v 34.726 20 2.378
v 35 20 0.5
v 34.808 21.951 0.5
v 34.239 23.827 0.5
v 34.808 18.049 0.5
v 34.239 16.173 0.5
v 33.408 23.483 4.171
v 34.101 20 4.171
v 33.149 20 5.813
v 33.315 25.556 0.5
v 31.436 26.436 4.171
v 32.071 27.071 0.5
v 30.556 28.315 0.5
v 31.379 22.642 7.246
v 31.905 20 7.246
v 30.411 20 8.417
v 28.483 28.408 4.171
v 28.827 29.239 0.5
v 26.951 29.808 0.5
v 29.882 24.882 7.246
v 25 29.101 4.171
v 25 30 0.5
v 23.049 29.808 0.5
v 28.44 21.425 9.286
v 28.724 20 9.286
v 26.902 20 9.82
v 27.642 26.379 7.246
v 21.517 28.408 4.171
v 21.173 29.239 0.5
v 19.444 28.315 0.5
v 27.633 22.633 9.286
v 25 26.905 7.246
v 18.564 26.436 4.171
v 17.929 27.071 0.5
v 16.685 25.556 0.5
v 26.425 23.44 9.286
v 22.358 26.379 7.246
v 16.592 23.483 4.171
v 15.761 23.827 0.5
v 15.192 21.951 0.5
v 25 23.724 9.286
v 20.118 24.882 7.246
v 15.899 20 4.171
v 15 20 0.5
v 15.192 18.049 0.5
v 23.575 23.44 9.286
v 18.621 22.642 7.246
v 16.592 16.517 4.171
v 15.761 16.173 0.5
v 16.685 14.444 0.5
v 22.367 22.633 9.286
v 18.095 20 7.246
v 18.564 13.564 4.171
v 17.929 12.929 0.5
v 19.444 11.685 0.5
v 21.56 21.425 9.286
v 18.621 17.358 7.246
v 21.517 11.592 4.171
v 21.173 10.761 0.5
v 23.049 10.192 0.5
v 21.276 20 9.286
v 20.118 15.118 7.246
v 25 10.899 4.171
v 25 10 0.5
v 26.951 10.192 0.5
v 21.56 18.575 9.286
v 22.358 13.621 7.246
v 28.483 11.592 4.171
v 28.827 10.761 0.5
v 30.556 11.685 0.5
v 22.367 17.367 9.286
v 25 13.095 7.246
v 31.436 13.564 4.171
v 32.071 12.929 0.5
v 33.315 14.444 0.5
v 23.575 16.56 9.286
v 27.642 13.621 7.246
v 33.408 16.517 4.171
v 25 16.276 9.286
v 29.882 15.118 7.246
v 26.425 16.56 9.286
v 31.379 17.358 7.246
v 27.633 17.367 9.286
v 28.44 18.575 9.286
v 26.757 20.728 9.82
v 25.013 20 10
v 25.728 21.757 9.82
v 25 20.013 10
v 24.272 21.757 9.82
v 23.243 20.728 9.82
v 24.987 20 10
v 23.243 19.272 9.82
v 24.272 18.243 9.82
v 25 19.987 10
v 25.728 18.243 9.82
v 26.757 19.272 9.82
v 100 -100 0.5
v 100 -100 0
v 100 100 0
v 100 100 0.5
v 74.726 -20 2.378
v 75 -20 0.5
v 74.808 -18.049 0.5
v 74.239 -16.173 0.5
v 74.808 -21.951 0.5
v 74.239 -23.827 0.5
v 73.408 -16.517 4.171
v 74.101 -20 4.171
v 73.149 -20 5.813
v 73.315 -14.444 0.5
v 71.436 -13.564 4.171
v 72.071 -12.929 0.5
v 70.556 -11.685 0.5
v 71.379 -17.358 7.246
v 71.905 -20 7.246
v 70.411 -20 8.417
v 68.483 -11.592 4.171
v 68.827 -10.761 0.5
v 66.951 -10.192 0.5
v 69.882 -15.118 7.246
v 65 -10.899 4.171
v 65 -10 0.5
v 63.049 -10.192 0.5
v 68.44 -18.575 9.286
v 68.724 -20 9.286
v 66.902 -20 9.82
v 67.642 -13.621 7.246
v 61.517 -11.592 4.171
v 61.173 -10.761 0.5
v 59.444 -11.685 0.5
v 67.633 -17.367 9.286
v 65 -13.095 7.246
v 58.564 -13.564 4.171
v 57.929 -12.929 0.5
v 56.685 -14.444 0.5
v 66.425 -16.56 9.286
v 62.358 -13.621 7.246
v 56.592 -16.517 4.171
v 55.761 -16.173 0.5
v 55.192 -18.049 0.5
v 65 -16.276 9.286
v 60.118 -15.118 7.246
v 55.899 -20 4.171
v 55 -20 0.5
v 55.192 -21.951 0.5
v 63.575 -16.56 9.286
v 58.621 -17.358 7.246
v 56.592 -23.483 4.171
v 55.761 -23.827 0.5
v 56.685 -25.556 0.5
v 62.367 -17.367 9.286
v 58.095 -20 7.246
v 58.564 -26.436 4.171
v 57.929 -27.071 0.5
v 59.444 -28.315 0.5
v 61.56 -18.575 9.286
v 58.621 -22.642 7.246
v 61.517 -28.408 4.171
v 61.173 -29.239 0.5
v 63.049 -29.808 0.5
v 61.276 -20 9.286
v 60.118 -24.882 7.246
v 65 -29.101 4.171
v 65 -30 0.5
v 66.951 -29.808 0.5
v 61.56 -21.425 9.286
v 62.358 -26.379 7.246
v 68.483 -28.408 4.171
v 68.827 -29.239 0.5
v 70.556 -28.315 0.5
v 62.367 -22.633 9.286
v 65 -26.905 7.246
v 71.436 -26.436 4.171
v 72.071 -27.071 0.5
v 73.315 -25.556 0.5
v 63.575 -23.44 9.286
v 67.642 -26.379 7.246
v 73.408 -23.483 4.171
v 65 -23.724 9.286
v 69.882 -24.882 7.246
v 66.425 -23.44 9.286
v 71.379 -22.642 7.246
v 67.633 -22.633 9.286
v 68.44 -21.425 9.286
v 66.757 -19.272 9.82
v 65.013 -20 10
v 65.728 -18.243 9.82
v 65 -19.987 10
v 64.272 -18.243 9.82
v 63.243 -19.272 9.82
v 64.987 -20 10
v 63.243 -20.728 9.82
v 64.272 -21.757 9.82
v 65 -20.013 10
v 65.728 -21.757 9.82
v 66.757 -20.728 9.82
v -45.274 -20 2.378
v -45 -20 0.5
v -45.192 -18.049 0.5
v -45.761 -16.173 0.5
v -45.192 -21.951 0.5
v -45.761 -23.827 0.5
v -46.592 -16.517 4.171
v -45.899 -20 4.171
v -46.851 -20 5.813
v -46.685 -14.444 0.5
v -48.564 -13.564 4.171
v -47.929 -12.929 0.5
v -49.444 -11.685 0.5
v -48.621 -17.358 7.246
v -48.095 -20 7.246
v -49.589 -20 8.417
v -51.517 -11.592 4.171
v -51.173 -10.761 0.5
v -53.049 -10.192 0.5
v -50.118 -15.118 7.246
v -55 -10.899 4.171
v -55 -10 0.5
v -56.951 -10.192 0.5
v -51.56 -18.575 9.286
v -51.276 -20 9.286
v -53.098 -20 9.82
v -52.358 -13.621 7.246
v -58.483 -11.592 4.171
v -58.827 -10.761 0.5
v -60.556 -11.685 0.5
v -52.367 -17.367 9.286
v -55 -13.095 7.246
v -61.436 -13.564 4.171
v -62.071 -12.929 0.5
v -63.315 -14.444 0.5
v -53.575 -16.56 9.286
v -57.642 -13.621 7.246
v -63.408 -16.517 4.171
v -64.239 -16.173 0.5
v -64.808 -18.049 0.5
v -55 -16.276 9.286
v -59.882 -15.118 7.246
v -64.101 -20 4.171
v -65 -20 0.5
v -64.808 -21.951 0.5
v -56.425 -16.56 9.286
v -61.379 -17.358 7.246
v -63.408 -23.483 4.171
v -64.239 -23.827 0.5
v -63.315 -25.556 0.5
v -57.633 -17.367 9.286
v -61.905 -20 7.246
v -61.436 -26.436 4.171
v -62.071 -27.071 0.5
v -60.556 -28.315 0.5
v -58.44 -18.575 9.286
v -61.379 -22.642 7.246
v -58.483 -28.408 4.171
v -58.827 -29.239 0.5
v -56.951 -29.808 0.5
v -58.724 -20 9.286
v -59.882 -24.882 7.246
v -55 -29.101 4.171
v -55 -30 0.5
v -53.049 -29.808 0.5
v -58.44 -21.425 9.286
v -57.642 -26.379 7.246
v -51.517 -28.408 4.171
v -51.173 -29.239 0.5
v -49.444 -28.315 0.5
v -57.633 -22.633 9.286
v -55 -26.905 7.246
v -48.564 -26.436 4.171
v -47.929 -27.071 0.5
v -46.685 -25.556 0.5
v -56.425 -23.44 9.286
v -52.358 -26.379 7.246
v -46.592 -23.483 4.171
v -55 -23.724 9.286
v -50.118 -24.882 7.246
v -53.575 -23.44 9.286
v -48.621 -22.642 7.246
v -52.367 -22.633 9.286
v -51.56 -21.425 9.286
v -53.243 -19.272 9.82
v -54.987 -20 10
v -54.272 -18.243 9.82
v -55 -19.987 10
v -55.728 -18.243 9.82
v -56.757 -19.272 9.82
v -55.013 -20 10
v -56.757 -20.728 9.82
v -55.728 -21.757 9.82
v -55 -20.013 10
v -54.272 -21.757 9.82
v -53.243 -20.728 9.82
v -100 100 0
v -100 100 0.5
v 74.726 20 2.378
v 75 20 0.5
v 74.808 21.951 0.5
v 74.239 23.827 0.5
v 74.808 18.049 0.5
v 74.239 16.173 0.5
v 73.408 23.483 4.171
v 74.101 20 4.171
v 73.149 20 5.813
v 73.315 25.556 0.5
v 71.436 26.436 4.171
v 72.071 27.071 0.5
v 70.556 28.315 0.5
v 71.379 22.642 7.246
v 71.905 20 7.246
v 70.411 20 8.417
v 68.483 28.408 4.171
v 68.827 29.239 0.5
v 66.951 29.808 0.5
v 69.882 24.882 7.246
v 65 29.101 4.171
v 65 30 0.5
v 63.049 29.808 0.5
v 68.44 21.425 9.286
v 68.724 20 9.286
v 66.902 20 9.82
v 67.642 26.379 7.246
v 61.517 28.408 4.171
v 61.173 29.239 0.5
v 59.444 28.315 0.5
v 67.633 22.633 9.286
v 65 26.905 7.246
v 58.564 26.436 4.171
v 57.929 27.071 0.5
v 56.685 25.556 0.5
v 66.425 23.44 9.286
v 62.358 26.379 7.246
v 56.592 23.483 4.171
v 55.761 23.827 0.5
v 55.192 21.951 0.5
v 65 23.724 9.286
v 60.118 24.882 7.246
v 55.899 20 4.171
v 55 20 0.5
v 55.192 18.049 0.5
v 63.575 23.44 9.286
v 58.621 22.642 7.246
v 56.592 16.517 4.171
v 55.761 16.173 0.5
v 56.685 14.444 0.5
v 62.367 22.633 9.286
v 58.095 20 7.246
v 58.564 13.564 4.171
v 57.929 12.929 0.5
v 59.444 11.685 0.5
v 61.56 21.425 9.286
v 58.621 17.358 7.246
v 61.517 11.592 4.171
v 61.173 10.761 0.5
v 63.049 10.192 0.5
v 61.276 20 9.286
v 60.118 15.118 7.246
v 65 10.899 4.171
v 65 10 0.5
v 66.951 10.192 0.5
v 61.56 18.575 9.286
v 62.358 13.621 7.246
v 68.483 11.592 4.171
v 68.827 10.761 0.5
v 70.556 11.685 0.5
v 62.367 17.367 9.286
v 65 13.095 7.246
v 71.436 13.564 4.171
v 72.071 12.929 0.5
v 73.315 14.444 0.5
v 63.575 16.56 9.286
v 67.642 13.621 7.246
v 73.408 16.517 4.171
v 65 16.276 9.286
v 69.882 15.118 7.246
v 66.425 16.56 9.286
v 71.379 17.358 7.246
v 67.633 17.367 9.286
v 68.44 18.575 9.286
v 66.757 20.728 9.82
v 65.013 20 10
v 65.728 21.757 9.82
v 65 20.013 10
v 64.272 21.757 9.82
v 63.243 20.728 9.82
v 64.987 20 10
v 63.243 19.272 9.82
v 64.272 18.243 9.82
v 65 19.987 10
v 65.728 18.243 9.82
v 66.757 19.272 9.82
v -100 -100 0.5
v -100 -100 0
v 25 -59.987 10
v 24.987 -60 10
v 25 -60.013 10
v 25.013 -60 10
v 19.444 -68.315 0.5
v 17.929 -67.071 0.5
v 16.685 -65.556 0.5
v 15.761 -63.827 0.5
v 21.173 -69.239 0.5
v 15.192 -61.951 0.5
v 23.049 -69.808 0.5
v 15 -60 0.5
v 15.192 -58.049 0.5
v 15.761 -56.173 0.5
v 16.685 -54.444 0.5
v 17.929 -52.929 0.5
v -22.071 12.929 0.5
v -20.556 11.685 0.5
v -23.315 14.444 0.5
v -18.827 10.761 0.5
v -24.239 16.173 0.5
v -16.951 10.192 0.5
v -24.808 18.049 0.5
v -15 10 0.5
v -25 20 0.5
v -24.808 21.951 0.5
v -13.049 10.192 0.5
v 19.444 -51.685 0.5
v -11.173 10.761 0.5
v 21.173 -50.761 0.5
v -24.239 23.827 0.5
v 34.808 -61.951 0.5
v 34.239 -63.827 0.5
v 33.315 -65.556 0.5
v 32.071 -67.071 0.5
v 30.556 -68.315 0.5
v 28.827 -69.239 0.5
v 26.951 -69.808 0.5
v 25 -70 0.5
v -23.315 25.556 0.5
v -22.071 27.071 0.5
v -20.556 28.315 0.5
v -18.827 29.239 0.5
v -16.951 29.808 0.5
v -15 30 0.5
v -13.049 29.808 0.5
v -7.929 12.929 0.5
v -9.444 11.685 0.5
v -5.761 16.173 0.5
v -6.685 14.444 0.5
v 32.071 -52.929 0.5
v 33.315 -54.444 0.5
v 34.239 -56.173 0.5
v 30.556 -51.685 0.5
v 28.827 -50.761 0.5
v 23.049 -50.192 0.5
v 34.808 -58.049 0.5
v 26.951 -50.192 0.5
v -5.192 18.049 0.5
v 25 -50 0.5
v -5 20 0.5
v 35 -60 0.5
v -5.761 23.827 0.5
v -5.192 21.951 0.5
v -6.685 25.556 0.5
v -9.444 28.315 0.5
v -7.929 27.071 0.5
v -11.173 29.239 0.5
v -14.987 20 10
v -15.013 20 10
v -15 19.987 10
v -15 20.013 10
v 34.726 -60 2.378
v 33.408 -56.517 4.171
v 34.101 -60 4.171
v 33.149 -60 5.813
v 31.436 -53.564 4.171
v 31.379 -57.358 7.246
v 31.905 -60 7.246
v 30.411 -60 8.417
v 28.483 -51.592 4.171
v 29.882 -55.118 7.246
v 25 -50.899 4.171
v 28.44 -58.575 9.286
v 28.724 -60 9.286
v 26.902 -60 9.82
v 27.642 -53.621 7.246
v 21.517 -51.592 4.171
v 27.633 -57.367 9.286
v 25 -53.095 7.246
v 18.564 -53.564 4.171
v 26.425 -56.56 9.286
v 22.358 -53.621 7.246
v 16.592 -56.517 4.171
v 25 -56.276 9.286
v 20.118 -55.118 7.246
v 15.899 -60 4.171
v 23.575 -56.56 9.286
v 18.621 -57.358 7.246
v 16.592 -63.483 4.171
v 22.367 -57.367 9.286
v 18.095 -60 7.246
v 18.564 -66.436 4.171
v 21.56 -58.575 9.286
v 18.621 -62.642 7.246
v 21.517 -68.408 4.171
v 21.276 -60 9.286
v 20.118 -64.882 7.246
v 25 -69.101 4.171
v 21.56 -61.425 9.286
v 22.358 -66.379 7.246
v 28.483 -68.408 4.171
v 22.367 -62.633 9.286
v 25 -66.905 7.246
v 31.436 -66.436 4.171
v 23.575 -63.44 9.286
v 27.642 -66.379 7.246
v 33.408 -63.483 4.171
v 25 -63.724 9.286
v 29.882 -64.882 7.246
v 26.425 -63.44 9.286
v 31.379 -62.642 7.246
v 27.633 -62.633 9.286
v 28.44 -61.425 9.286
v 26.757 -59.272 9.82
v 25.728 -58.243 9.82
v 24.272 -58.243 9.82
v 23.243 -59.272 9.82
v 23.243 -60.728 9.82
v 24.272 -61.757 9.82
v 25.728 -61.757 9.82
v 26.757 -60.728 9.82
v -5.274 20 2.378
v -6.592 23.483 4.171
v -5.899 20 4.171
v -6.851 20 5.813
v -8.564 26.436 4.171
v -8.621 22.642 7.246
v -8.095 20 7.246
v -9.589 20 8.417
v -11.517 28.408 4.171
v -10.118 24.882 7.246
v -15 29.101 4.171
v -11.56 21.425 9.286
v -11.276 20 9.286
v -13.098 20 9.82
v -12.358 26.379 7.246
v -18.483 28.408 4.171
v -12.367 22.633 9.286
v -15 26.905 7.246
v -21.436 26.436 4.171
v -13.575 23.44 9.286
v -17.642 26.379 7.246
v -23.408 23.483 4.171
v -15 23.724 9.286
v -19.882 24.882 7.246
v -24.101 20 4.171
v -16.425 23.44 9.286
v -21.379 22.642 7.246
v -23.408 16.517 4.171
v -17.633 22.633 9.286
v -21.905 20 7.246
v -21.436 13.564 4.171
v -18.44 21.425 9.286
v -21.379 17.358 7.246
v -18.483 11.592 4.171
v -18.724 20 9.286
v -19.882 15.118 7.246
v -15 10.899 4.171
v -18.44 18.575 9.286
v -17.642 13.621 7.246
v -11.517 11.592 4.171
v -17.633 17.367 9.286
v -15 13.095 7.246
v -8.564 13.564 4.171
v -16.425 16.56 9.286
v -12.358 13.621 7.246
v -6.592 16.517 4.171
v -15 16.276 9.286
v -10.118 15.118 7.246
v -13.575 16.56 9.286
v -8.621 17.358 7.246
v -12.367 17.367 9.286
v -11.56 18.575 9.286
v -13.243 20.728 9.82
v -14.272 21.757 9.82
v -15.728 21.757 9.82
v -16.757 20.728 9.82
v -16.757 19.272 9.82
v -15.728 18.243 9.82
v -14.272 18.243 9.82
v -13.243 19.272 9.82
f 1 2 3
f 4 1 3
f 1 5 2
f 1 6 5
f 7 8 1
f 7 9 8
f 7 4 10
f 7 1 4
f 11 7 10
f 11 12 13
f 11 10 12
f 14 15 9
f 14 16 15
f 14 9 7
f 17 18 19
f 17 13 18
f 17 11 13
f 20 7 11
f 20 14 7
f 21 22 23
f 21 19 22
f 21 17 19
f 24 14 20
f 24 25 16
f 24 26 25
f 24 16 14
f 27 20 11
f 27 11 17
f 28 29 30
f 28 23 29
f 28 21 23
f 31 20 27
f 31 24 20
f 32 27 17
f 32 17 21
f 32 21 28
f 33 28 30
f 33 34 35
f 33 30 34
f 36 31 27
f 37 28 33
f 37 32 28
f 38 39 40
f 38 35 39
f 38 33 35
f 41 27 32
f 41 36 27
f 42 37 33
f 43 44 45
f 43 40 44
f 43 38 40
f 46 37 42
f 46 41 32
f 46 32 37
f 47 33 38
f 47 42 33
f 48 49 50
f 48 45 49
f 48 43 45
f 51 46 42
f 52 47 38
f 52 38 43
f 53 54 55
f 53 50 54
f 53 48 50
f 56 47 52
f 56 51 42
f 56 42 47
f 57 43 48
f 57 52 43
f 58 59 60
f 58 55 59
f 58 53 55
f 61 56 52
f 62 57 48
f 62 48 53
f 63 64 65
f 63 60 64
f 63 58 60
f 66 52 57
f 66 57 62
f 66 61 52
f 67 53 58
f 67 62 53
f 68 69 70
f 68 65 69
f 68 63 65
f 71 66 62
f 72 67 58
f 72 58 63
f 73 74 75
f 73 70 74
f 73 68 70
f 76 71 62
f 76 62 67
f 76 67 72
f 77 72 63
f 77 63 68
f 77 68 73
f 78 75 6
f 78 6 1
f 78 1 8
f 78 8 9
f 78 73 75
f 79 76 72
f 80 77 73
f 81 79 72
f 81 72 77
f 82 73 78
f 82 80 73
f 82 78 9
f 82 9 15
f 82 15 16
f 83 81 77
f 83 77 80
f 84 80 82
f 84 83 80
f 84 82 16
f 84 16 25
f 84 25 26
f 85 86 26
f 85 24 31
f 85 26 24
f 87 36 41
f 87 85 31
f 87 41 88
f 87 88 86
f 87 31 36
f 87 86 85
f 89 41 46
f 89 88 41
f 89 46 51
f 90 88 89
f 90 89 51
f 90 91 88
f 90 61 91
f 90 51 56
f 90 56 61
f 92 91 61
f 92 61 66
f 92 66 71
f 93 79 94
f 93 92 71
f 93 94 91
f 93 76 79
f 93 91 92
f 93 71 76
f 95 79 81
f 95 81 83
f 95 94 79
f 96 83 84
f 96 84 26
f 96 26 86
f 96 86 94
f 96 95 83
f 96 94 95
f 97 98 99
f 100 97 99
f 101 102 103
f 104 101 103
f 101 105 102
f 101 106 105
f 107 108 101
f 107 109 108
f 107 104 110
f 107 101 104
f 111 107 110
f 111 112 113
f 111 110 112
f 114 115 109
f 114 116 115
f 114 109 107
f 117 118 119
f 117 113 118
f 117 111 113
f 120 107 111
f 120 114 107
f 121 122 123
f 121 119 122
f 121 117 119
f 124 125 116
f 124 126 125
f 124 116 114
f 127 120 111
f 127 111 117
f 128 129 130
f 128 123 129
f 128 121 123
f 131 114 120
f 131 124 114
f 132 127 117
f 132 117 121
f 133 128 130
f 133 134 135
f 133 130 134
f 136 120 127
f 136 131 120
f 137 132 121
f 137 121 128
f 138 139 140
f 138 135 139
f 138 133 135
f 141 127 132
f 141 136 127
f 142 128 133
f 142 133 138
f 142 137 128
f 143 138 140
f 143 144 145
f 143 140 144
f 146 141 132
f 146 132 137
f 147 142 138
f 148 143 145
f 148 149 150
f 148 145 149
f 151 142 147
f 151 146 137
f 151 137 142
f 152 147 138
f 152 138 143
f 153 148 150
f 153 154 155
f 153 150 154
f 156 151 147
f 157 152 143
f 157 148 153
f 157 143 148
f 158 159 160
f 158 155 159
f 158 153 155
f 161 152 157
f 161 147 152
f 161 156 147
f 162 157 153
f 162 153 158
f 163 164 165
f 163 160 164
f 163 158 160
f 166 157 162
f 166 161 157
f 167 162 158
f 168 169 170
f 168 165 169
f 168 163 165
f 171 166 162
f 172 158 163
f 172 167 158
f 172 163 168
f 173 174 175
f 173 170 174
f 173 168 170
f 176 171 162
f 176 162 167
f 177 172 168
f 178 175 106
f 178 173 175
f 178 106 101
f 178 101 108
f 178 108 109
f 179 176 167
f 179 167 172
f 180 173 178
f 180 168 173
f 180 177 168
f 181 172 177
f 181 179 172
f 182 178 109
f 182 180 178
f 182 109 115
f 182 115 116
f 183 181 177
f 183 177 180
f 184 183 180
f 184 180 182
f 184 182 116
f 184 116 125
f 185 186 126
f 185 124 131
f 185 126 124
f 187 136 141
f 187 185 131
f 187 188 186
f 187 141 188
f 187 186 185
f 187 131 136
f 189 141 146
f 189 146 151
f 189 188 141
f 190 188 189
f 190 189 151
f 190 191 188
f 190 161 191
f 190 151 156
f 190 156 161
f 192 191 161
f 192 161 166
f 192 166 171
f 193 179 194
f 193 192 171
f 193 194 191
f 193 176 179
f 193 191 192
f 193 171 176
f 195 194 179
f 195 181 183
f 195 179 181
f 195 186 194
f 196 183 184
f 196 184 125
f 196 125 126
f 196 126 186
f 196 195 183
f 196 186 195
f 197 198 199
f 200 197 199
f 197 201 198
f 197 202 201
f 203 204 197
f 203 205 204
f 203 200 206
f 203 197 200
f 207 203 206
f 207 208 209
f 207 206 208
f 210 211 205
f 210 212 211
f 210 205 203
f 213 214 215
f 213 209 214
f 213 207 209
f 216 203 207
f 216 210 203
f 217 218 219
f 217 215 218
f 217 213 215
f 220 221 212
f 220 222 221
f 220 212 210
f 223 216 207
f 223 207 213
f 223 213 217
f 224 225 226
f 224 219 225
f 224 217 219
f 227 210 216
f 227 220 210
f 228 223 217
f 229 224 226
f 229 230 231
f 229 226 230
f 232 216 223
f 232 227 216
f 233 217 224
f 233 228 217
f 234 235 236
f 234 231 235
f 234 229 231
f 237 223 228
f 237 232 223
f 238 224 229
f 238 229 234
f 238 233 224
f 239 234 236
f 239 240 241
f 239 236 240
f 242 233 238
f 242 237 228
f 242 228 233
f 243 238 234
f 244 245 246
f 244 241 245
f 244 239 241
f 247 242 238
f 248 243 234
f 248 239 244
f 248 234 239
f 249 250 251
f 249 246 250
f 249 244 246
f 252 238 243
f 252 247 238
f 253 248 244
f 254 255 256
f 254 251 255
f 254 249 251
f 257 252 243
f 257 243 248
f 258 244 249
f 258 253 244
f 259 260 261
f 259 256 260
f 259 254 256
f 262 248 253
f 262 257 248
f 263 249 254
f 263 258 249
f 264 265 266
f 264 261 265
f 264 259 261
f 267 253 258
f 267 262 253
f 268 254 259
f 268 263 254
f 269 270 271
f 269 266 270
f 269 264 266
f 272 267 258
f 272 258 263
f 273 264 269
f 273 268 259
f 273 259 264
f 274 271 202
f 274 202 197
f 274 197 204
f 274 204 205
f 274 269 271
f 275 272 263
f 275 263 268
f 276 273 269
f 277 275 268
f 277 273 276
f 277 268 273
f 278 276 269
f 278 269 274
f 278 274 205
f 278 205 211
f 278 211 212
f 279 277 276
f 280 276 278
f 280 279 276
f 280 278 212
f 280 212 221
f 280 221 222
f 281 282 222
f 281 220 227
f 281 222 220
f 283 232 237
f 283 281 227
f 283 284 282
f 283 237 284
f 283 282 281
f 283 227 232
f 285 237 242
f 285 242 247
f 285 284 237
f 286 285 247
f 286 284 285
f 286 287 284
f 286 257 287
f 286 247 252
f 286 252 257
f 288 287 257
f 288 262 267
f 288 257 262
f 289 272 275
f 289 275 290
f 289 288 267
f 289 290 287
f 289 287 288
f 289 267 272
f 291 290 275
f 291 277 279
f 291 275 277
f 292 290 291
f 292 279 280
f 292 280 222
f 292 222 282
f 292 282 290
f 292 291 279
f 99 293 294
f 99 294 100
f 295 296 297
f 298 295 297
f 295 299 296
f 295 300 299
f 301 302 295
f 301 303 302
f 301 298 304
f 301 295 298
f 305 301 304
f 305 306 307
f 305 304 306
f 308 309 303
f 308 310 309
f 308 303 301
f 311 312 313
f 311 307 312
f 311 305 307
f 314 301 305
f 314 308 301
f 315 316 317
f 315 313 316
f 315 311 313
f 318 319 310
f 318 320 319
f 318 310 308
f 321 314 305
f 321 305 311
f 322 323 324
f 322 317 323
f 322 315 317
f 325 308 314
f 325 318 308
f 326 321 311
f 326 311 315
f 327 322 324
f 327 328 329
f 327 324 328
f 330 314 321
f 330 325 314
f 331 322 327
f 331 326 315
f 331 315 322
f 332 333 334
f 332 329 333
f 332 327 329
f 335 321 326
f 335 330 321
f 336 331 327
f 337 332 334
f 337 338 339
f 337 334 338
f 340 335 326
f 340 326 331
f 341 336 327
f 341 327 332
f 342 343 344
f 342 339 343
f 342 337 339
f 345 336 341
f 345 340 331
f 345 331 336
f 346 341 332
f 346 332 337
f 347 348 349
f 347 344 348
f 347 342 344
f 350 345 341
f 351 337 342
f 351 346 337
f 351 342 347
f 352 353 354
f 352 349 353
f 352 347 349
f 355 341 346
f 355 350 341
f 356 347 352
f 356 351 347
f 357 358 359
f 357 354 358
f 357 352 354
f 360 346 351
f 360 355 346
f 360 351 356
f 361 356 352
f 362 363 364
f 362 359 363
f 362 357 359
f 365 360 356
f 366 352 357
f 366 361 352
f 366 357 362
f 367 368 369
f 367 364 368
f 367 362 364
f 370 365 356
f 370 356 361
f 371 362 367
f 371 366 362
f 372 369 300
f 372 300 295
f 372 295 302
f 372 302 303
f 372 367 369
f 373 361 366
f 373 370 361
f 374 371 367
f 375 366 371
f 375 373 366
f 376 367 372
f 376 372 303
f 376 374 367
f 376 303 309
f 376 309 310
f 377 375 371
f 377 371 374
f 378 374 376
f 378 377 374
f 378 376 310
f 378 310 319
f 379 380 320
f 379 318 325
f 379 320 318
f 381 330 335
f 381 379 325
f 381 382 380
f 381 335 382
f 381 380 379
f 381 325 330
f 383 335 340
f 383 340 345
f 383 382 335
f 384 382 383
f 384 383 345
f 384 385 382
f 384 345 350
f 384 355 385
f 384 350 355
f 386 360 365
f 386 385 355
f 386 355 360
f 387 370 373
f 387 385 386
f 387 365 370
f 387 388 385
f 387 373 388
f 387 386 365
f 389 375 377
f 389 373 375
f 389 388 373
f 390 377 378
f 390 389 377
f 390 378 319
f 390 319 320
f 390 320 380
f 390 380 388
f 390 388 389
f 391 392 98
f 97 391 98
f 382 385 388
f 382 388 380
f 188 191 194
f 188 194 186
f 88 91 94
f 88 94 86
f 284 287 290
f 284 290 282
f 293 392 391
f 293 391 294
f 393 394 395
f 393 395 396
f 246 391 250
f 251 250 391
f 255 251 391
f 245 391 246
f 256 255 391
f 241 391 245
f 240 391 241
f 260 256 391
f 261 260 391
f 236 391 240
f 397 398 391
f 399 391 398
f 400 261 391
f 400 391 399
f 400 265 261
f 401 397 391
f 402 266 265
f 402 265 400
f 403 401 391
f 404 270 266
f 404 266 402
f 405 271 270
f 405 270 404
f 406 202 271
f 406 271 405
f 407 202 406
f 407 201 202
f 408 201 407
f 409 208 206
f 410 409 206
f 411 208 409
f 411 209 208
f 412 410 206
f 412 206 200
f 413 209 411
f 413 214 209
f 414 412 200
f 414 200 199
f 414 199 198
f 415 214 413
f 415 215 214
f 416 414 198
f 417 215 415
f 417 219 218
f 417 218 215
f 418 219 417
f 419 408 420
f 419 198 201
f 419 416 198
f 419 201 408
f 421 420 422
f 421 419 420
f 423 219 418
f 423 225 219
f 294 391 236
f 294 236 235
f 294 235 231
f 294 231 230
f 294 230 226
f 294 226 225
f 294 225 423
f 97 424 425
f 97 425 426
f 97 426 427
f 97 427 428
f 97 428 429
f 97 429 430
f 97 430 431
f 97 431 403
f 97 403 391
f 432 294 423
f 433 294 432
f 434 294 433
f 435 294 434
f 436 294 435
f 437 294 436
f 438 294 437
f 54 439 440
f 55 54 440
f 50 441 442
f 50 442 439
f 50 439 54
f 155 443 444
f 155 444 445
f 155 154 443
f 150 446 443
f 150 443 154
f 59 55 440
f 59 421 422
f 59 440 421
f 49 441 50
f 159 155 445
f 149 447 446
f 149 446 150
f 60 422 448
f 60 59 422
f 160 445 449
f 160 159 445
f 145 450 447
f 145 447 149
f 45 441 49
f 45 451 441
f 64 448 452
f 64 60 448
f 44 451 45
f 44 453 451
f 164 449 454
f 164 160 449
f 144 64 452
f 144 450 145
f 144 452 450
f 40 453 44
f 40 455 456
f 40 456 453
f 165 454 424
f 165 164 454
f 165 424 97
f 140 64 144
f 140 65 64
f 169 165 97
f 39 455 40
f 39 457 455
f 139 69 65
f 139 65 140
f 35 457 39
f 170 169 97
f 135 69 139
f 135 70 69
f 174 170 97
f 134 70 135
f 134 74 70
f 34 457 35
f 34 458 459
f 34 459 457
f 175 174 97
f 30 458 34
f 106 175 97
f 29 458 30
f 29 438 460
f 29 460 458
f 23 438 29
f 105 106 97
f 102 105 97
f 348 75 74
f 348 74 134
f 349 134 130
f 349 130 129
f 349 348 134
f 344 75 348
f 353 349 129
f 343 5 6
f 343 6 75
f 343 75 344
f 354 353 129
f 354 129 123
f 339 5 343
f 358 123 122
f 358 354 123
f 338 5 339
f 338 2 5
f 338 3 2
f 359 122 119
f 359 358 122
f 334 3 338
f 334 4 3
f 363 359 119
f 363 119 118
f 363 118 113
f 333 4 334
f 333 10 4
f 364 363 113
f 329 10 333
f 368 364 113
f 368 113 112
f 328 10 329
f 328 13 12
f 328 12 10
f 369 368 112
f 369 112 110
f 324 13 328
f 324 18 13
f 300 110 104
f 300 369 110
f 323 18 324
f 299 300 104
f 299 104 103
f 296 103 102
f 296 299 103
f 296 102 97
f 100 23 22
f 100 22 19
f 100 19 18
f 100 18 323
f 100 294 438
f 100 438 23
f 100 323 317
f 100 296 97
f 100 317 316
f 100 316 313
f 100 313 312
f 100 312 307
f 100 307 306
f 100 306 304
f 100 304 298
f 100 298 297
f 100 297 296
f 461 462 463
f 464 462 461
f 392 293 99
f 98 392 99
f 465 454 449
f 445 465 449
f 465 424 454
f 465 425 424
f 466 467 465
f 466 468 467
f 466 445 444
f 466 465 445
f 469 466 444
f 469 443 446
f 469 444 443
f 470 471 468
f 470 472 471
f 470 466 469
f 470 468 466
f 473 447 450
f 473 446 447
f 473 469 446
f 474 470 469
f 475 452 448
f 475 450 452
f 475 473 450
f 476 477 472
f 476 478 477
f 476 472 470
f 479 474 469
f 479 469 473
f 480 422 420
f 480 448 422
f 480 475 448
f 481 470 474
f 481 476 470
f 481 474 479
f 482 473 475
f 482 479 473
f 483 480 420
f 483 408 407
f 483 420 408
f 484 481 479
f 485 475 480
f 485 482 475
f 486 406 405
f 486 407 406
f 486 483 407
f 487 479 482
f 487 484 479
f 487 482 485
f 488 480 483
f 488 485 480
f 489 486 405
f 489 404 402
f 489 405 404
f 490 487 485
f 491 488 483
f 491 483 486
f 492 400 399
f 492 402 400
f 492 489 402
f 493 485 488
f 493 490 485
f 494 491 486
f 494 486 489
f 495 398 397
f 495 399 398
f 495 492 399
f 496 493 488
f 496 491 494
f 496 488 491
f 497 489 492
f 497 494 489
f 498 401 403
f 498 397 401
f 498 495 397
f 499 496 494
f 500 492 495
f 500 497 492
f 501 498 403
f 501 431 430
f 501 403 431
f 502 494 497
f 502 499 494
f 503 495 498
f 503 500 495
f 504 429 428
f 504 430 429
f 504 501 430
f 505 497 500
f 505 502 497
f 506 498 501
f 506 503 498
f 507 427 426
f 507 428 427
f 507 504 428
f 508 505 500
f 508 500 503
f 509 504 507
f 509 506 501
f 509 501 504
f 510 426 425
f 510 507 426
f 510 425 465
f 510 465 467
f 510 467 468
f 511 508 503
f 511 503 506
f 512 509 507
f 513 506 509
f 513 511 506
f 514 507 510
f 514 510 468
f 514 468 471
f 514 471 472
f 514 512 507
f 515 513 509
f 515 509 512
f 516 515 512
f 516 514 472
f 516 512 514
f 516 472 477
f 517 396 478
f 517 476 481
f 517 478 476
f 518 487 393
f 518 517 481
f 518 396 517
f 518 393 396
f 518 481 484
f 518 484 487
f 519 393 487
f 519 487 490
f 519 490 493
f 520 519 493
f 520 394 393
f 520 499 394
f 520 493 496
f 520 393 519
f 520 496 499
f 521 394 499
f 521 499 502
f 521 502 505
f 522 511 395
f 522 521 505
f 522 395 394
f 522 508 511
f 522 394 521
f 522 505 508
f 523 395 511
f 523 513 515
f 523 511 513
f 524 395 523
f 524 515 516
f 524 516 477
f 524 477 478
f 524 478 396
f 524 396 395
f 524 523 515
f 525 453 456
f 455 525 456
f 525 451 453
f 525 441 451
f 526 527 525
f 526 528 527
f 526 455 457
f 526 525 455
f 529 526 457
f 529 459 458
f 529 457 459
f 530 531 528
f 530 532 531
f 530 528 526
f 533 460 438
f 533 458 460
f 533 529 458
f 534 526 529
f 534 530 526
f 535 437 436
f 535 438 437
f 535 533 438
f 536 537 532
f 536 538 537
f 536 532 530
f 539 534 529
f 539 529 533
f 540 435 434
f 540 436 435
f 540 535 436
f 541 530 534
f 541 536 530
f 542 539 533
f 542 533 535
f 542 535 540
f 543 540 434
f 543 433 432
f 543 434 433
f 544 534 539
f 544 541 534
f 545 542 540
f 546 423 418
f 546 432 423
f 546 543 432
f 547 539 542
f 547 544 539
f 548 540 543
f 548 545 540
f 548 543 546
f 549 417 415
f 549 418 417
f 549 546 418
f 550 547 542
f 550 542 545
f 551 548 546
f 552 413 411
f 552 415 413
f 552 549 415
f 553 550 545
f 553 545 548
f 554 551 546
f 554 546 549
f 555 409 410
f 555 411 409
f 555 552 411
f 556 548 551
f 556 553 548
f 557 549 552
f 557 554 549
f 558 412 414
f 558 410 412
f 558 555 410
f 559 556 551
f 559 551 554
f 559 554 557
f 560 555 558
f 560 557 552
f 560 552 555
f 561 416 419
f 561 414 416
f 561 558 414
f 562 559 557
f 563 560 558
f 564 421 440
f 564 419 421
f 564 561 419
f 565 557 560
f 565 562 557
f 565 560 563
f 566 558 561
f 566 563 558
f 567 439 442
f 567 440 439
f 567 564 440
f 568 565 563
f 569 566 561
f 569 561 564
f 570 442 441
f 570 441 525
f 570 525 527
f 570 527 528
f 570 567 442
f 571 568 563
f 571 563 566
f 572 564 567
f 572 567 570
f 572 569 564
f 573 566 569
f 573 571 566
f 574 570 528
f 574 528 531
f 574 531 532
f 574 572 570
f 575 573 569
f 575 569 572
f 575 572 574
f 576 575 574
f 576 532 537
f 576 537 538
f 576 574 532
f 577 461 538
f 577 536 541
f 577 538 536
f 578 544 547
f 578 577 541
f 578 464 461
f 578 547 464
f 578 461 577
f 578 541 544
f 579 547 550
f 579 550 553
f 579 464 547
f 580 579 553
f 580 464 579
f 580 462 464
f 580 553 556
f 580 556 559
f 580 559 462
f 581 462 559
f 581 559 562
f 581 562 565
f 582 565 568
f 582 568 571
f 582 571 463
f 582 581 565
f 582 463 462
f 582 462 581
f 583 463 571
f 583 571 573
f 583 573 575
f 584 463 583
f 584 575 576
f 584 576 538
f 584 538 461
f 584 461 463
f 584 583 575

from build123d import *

# Parameters (mm, degrees)
F0_W     = 200
F0_H     = 200
F2_DEPTH = 0.5
F1_R     = 10
F3_DEPTH = 10


# Not quite as in the source:
# - a fillet or chamfer that OpenCascade refuses, or shapes differently, is made with other operations: its cross-section is extruded or revolved along the edge and cut away or added


with BuildPart() as f2:
    # F0 (on Top) → F2 (new body)
    with BuildSketch(Plane.XY):
        Rectangle(F0_W, F0_H)
    extrude(amount=F2_DEPTH)

    # F1 (on face) → F3 (join)
    with BuildSketch(Plane.XY):
        with Locations((-55, -20)):
            Circle(F1_R)
        with Locations((-15, 20)):
            Circle(F1_R)
        with Locations((25, -60)):
            Circle(F1_R)
        with Locations((25, 20)):
            Circle(F1_R)
        with Locations((65, -20)):
            Circle(F1_R)
        with Locations((65, 20)):
            Circle(F1_R)
    extrude(amount=F3_DEPTH)

    # F4: fillet of radius 10 on 6 edges, made by hand

    # F4_s1 → F4_t2 (revolve, cut)
    with BuildSketch(Plane.XZ.offset(20)):
        with BuildLine():
            ThreePointArc((-45, 0.5), (-48.0954678017, 7.2456883731), (-54.9874921777, 10))
            Line((-54.9874921777, 10), (-45, 10))
            Line((-45, 10), (-45, 0.5))
        make_face()
    revolve(axis=Axis((-55, -20, 10), (0, 0, 1)), mode=Mode.SUBTRACT)

    # F4_s3 → F4_t4 (revolve, cut)
    with BuildSketch(Plane.XZ.offset(-20)):
        with BuildLine():
            ThreePointArc((-5, 0.5), (-8.0954678017, 7.2456883731), (-14.9874921777, 10))
            Line((-14.9874921777, 10), (-5, 10))
            Line((-5, 10), (-5, 0.5))
        make_face()
    revolve(axis=Axis((-15, 20, 10), (0, 0, 1)), mode=Mode.SUBTRACT)

    # F4_s5 → F4_t6 (revolve, cut)
    with BuildSketch(Plane.XZ.offset(-20)):
        with BuildLine():
            ThreePointArc((35, 0.5), (31.9045321983, 7.2456883731), (25.0125078223, 10))
            Line((25.0125078223, 10), (35, 10))
            Line((35, 10), (35, 0.5))
        make_face()
    revolve(axis=Axis((25, 20, 10), (0, 0, 1)), mode=Mode.SUBTRACT)

    # F4_s7 → F4_t8 (revolve, cut)
    with BuildSketch(Plane.XZ.offset(-20)):
        with BuildLine():
            ThreePointArc((75, 0.5), (71.9045321983, 7.2456883731), (65.0125078223, 10))
            Line((65.0125078223, 10), (75, 10))
            Line((75, 10), (75, 0.5))
        make_face()
    revolve(axis=Axis((65, 20, 10), (0, 0, 1)), mode=Mode.SUBTRACT)

    # F4_s9 → F4_t10 (revolve, cut)
    with BuildSketch(Plane.XZ.offset(20)):
        with BuildLine():
            ThreePointArc((75, 0.5), (71.9045321983, 7.2456883731), (65.0125078223, 10))
            Line((65.0125078223, 10), (75, 10))
            Line((75, 10), (75, 0.5))
        make_face()
    revolve(axis=Axis((65, -20, 10), (0, 0, 1)), mode=Mode.SUBTRACT)

    # F4_s11 → F4_t12 (revolve, cut)
    with BuildSketch(Plane.XZ.offset(60)):
        with BuildLine():
            ThreePointArc((35, 0.5), (31.9045321983, 7.2456883731), (25.0125078223, 10))
            Line((25.0125078223, 10), (35, 10))
            Line((35, 10), (35, 0.5))
        make_face()
    revolve(axis=Axis((25, -60, 10), (0, 0, 1)), mode=Mode.SUBTRACT)


solid = f2.part
